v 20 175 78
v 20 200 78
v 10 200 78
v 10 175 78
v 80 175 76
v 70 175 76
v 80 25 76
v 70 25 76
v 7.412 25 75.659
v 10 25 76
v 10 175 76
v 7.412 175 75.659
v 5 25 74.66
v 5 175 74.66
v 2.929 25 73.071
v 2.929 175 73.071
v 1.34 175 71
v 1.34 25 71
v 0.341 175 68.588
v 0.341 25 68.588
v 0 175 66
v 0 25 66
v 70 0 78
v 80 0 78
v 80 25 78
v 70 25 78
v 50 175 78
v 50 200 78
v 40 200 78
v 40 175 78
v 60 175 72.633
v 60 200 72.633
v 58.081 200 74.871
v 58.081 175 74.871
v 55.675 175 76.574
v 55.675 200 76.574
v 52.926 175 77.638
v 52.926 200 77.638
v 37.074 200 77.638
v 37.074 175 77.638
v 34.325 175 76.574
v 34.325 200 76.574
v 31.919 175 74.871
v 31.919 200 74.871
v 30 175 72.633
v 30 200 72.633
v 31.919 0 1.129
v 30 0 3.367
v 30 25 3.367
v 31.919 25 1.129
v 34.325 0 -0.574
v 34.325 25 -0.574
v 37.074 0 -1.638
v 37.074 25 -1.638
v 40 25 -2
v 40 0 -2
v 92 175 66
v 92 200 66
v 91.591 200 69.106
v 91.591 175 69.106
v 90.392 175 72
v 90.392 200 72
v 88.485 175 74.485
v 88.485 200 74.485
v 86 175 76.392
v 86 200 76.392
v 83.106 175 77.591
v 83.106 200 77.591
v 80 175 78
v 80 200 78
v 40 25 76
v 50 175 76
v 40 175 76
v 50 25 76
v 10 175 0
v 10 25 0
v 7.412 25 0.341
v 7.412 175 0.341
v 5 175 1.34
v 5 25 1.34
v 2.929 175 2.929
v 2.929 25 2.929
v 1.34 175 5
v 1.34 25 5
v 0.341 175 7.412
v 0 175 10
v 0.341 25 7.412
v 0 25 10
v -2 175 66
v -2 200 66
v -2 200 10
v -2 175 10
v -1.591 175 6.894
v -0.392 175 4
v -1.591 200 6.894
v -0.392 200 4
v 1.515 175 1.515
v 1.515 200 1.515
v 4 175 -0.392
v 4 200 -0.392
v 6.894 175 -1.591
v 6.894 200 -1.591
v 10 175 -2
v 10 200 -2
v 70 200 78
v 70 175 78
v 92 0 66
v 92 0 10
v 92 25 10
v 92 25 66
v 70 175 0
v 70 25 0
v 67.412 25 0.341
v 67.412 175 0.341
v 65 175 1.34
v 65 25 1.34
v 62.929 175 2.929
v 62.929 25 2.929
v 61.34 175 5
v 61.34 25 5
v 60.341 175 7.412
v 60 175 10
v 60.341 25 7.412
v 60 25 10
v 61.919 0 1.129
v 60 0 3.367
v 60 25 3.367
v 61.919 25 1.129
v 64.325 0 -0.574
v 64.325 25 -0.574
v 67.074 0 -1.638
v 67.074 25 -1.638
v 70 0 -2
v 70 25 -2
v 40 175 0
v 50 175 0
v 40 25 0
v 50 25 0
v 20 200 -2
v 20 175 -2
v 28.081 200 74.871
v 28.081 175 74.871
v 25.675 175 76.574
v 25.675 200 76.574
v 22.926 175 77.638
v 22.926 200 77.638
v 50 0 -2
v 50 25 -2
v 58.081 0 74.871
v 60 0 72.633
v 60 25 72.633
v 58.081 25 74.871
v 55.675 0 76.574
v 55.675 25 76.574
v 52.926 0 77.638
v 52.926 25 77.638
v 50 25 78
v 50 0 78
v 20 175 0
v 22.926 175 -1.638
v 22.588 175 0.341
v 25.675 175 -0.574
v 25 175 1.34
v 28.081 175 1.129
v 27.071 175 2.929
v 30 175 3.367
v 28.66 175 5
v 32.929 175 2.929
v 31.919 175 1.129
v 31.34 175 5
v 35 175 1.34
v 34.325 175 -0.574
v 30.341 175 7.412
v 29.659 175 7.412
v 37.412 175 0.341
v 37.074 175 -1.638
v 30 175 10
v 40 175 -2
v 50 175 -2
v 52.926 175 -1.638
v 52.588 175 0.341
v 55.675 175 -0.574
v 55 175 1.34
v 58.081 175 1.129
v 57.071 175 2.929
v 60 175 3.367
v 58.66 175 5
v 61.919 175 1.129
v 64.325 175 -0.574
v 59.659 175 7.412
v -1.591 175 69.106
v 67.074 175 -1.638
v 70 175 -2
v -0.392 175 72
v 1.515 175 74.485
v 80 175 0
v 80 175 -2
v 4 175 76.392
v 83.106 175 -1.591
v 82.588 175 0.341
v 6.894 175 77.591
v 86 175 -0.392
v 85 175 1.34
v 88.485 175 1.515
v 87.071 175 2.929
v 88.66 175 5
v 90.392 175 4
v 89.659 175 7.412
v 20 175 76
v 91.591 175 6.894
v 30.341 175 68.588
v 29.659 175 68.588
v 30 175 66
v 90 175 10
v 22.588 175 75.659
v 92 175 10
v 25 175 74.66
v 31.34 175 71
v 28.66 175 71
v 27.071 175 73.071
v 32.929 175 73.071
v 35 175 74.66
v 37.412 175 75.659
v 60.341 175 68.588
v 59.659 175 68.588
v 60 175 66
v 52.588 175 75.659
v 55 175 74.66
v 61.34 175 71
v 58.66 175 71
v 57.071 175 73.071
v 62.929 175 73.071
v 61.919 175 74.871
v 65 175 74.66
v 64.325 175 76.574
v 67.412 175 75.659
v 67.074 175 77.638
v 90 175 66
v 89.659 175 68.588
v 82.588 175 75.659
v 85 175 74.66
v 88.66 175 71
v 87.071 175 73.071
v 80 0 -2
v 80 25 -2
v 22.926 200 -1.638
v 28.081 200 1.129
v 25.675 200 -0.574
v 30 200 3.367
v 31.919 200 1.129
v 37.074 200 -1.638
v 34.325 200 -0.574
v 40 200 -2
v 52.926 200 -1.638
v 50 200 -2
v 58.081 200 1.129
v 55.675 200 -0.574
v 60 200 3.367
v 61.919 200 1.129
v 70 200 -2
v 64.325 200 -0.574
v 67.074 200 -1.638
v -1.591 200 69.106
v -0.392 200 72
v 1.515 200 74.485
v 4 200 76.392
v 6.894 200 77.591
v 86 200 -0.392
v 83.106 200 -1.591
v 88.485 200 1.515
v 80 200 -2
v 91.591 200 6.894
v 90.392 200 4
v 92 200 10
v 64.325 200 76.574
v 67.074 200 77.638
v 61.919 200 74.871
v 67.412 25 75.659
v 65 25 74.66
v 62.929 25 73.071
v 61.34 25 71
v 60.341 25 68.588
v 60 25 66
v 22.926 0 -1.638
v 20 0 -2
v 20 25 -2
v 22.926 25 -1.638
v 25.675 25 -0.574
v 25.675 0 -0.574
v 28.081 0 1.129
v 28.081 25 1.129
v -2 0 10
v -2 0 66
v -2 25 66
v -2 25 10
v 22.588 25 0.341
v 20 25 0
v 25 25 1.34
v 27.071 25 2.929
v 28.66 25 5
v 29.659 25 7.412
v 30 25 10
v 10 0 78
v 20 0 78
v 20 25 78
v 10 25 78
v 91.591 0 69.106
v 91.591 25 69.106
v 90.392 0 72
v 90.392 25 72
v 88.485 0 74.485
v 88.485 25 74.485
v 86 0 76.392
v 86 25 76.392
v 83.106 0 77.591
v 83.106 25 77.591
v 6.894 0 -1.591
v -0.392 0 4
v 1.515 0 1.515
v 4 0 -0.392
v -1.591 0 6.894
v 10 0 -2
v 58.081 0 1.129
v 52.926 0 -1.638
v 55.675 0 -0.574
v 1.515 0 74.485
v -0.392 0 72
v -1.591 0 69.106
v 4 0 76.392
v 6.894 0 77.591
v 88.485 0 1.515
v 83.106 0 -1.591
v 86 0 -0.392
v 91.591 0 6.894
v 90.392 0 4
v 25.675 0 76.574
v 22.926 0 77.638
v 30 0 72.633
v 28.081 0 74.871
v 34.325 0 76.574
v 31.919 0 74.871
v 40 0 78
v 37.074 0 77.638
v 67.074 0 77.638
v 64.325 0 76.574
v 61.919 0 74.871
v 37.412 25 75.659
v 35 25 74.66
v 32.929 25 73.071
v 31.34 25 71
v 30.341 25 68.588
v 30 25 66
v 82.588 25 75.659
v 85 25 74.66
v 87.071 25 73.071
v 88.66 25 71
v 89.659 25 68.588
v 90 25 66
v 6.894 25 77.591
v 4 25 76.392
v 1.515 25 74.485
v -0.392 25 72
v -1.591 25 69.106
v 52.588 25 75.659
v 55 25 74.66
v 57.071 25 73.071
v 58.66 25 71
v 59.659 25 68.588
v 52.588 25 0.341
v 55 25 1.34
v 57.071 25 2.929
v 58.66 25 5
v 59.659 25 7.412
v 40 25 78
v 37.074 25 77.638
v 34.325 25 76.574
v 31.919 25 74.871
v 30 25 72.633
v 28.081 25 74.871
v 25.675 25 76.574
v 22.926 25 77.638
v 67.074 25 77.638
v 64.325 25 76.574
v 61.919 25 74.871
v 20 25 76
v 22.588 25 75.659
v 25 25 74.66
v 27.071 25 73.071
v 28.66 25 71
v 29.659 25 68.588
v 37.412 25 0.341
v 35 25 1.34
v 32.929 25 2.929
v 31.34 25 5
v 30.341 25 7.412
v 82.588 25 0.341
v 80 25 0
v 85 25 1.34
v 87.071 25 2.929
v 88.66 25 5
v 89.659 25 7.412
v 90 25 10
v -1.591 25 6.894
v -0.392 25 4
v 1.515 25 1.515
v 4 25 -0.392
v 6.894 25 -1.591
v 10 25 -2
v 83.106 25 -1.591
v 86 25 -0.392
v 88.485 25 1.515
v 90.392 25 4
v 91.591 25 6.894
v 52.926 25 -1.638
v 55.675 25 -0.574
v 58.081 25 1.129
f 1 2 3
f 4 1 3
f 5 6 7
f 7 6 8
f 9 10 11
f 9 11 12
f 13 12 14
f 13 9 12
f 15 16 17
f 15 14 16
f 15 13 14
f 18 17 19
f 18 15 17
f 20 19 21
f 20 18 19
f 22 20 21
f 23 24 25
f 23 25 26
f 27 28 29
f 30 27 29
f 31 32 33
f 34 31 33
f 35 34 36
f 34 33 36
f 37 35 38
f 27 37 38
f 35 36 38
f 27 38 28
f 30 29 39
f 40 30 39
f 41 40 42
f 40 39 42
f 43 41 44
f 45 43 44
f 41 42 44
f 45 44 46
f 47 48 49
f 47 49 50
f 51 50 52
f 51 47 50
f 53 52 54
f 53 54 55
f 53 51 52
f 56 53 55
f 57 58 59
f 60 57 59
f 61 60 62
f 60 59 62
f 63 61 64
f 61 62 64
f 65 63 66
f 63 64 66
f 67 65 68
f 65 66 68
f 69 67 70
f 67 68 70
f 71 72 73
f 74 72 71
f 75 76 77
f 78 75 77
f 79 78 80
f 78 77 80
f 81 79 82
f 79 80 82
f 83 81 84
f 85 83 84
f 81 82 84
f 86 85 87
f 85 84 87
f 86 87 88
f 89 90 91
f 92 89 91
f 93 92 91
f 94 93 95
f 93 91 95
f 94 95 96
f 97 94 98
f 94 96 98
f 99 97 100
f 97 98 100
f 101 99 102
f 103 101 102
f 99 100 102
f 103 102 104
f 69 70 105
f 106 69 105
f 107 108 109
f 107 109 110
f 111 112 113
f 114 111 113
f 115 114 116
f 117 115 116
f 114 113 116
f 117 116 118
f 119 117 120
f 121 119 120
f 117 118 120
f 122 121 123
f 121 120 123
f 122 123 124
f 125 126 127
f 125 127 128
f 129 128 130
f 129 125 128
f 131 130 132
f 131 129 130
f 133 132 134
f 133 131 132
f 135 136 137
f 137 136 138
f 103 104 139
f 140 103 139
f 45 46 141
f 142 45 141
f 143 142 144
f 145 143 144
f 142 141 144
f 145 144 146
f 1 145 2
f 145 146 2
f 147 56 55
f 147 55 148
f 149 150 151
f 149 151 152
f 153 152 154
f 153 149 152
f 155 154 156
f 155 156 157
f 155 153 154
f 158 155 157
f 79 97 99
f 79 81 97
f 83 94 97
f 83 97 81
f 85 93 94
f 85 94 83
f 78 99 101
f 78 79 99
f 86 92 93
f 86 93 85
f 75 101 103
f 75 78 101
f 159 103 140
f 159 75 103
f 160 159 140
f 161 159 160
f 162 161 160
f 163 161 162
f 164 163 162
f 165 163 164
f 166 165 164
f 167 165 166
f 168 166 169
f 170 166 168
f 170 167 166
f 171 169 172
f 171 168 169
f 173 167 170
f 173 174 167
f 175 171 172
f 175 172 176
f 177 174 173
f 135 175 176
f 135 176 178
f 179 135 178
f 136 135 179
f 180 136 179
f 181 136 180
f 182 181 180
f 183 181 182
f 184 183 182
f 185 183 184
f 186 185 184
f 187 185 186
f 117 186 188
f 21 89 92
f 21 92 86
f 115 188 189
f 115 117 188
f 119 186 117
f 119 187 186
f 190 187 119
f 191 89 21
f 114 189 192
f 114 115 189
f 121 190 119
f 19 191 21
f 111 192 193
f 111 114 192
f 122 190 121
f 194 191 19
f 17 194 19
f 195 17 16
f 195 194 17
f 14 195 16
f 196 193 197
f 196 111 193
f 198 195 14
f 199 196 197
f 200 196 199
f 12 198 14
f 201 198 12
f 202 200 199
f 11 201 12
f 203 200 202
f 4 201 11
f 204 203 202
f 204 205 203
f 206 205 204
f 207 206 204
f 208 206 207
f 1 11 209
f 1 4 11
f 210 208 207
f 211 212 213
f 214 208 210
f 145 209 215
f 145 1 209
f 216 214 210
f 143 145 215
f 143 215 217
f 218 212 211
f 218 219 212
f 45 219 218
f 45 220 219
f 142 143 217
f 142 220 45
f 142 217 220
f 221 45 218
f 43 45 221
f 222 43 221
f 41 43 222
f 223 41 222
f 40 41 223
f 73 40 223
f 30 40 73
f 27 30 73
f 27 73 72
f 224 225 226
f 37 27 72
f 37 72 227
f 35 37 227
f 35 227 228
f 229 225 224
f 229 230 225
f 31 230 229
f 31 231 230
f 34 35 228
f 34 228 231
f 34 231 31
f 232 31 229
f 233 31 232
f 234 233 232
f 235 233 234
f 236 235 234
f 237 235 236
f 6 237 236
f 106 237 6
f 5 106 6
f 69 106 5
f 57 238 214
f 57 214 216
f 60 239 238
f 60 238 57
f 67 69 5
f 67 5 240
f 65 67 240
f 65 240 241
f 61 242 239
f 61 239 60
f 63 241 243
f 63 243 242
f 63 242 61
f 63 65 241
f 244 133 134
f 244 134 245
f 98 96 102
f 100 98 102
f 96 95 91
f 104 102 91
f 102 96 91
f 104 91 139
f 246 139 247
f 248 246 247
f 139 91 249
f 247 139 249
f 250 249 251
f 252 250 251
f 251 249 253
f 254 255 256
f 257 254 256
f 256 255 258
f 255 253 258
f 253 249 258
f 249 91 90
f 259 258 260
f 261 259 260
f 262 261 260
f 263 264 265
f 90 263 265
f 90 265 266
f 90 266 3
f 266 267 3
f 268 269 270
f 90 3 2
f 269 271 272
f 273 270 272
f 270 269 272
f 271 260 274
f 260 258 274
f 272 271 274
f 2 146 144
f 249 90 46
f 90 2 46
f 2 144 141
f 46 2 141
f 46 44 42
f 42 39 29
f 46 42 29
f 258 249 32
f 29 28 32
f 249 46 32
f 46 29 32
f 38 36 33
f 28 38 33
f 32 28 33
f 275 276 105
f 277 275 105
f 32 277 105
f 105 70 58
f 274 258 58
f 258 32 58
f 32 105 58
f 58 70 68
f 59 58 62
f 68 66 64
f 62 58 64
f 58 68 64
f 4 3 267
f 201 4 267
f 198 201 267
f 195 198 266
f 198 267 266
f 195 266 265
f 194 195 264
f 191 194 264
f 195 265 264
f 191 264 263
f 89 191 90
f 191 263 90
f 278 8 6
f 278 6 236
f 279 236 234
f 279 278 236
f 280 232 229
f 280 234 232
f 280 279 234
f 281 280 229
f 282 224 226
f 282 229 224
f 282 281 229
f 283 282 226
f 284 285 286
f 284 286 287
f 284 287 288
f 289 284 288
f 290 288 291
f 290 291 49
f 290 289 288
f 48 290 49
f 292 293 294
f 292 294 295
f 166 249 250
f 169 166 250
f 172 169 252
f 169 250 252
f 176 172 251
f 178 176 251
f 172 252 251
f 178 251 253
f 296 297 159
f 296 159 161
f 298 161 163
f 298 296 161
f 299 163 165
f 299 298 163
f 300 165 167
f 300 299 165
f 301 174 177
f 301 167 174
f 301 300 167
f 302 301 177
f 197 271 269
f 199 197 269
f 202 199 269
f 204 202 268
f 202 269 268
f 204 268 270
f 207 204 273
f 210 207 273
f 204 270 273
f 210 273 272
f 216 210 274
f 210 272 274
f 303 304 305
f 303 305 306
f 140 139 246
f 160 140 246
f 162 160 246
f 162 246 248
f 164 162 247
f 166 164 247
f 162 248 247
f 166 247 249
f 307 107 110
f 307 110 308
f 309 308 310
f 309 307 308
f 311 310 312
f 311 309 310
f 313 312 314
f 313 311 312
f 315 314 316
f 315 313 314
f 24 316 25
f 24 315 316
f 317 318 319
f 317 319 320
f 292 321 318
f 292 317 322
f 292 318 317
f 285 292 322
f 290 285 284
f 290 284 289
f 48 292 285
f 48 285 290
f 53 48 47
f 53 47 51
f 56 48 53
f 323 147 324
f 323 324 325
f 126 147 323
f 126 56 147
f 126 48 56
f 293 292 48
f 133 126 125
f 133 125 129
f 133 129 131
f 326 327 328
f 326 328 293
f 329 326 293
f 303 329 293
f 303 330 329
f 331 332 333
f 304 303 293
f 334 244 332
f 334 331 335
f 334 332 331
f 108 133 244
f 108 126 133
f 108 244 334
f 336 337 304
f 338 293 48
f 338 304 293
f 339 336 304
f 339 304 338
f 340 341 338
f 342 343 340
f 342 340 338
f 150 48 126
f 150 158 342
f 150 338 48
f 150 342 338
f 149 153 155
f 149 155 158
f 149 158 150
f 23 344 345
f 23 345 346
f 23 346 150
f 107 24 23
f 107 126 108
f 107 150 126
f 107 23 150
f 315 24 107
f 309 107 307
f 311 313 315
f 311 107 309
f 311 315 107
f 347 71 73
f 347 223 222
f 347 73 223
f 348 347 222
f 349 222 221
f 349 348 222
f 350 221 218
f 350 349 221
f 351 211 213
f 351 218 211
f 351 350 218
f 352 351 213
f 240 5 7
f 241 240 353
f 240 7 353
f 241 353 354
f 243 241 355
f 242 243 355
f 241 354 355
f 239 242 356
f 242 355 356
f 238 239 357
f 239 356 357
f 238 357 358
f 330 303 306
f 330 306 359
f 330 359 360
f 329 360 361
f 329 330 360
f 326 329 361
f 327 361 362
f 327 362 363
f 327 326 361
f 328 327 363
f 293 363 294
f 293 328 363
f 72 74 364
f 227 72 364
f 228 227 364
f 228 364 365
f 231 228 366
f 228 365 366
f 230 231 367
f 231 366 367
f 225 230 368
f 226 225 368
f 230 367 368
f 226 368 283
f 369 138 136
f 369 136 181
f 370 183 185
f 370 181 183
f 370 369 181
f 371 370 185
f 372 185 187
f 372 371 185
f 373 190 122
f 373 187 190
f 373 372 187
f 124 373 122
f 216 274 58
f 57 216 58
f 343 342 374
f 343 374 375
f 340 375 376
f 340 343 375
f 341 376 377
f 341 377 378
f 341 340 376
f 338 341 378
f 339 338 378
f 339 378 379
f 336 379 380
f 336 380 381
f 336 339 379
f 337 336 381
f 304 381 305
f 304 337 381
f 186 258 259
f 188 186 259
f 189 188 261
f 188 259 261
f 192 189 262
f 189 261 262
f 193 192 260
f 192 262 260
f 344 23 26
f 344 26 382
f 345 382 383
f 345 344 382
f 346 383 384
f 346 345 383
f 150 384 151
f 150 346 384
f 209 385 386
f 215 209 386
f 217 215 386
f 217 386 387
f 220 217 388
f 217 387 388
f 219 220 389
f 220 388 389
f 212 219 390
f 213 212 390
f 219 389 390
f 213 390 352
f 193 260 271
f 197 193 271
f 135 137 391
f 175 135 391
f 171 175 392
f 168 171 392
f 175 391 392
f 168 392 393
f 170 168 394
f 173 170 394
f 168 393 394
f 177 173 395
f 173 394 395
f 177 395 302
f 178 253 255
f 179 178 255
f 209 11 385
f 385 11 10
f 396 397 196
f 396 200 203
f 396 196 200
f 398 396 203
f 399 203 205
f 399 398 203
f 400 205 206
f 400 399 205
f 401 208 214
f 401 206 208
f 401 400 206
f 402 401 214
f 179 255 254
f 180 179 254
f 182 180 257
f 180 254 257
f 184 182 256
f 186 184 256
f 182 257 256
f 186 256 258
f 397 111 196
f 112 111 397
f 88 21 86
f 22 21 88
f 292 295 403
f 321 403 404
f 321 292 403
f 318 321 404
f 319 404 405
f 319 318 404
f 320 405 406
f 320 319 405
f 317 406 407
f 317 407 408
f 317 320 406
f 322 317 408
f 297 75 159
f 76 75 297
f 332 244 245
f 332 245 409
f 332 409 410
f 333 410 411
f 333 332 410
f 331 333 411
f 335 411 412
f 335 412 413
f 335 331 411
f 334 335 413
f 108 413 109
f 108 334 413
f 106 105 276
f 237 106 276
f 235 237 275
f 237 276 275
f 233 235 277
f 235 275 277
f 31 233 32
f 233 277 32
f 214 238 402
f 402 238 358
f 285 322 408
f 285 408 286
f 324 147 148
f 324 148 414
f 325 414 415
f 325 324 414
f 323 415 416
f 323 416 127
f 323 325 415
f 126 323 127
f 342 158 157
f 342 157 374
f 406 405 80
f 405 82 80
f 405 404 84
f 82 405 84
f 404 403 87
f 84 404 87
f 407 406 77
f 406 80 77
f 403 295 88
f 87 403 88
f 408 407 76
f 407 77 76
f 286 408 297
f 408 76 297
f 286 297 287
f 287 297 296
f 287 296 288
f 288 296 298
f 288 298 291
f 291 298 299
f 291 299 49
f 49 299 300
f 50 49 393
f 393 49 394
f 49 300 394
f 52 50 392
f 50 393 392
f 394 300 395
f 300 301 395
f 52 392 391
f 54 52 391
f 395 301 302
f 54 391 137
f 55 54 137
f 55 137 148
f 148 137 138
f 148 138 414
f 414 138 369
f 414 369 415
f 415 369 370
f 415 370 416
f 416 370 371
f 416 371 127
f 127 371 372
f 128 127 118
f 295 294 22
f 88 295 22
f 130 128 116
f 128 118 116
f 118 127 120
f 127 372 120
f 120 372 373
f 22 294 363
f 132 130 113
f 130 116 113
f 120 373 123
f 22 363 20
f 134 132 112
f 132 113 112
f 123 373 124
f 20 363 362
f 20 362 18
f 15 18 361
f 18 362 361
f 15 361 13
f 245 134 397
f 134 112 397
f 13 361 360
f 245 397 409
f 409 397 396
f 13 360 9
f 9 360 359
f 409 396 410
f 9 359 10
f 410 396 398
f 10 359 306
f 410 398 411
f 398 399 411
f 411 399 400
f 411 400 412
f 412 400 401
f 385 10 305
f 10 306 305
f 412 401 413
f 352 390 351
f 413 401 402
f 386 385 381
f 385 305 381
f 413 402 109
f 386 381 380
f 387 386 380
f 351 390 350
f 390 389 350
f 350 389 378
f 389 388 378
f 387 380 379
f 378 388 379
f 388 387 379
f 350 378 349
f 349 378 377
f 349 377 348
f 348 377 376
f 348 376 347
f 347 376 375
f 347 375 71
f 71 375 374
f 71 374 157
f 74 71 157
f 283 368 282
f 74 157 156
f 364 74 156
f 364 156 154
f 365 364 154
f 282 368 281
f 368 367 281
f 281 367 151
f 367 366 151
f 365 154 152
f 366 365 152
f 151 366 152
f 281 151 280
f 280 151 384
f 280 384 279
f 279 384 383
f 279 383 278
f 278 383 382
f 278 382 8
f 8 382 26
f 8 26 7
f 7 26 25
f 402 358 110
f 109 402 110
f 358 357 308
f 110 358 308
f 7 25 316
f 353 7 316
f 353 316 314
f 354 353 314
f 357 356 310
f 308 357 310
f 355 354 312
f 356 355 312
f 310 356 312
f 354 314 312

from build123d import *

# Parameters (mm, degrees)
F0_W     = 100
F0_H     = 76
F1_DEPTH = 30
F2_R     = 10
F5_W     = 115
F5_H     = 96
F5_W_2   = 100
F5_H_2   = 56
F6_DEPTH = 30
F8_DEPTH = 25


with BuildPart() as f1:
    # F0 (on Right) → F1 (new body)
    with BuildSketch(Plane.YZ):
        with Locations((50, 38)):
            Rectangle(F0_W, F0_H)
    extrude(amount=F1_DEPTH)

    # F2
    f2_edges = [f1.edges().sort_by_distance(p)[0] for p in [
        (30, 50, 76),
        (0, 50, 76),
        (30, 50, 0),
        (0, 50, 0),
    ]]
    fillet(f2_edges, radius=F2_R)

    # F3: F1 across face


with BuildPart() as f1_1:
    add(f1.part)
    add(f1.part.mirror(Plane(origin=(30, 50, 38), x_dir=(0, 1, 0), z_dir=(1, 0, 0))))

    # F4: F1 across face


with BuildPart() as f1_2:
    add(f1_1.part)
    add(f1_1.part.mirror(Plane(origin=(60, 50, 38), x_dir=(0, 1, 0), z_dir=(1, 0, 0))))

    # F5 (on face) → F6 (cut)
    with BuildSketch(Plane.YZ.offset(120)):
        with Locations((52.5, 38)):
            Rectangle(F5_W, F5_H)
        with Locations((50, 38)):
            Rectangle(F5_W_2, F5_H_2, mode=Mode.SUBTRACT)
        with Locations((50, 38)):
            Rectangle(F5_W_2, F5_H_2)
    extrude(amount=-F6_DEPTH, mode=Mode.SUBTRACT)

    # F7 (on face) → F8 (join)
    with BuildSketch(Plane.XZ):
        with BuildLine():
            ThreePointArc((60, 3.3667504193), (64.3254513381, -0.5735281474), (70, -2))
            Line((70, -2), (80, -2))
            ThreePointArc((80, -2), (88.4852813742, 1.5147186258), (92, 10))
            Line((92, 10), (92, 66))
            ThreePointArc((92, 66), (88.4852813742, 74.4852813742), (80, 78))
            Line((80, 78), (70, 78))
            ThreePointArc((70, 78), (64.3254513381, 76.5735281474), (60, 72.6332495807))
            ThreePointArc((60, 72.6332495807), (55.6745486619, 76.5735281474), (50, 78))
            Line((50, 78), (40, 78))
            ThreePointArc((40, 78), (34.3254513381, 76.5735281474), (30, 72.6332495807))
            ThreePointArc((30, 72.6332495807), (25.6745486619, 76.5735281474), (20, 78))
            Line((20, 78), (10, 78))
            ThreePointArc((10, 78), (1.5147186258, 74.4852813742), (-2, 66))
            Line((-2, 66), (-2, 10))
            ThreePointArc((-2, 10), (1.5147186258, 1.5147186258), (10, -2))
            Line((10, -2), (20, -2))
            ThreePointArc((20, -2), (25.6745486619, -0.5735281474), (30, 3.3667504193))
            ThreePointArc((30, 3.3667504193), (34.3254513381, -0.5735281474), (40, -2))
            Line((40, -2), (50, -2))
            ThreePointArc((50, -2), (55.6745486619, -0.5735281474), (60, 3.3667504193))
        make_face()
        with BuildLine():
            ThreePointArc((0, 66), (2.9289321881, 73.0710678119), (10, 76))
            Line((10, 76), (20, 76))
            ThreePointArc((20, 76), (27.0710678119, 73.0710678119), (30, 66))
            ThreePointArc((30, 66), (32.9289321881, 73.0710678119), (40, 76))
            Line((40, 76), (50, 76))
            ThreePointArc((50, 76), (57.0710678119, 73.0710678119), (60, 66))
            ThreePointArc((60, 66), (62.9289321881, 73.0710678119), (70, 76))
            Line((70, 76), (80, 76))
            ThreePointArc((80, 76), (87.0710678119, 73.0710678119), (90, 66))
            Line((90, 66), (90, 10))
            ThreePointArc((90, 10), (87.0710678119, 2.9289321881), (80, 0))
            Line((80, 0), (70, 0))
            ThreePointArc((70, 0), (62.9289321881, 2.9289321881), (60, 10))
            ThreePointArc((60, 10), (57.0710678119, 2.9289321881), (50, 0))
            Line((50, 0), (40, 0))
            ThreePointArc((40, 0), (32.9289321881, 2.9289321881), (30, 10))
            ThreePointArc((30, 10), (27.0710678119, 2.9289321881), (20, 0))
            Line((20, 0), (10, 0))
            ThreePointArc((10, 0), (2.9289321881, 2.9289321881), (0, 10))
            Line((0, 10), (0, 66))
        make_face(mode=Mode.SUBTRACT)
    extrude(amount=-F8_DEPTH)

    # F9: F1 across face


with BuildPart() as f1_3:
    add(f1_2.part)
    add(f1_2.part.mirror(Plane(origin=(45, 100, 38), x_dir=(-1, 0, 0), z_dir=(0, 1, 0))))


solid = f1_3.part
